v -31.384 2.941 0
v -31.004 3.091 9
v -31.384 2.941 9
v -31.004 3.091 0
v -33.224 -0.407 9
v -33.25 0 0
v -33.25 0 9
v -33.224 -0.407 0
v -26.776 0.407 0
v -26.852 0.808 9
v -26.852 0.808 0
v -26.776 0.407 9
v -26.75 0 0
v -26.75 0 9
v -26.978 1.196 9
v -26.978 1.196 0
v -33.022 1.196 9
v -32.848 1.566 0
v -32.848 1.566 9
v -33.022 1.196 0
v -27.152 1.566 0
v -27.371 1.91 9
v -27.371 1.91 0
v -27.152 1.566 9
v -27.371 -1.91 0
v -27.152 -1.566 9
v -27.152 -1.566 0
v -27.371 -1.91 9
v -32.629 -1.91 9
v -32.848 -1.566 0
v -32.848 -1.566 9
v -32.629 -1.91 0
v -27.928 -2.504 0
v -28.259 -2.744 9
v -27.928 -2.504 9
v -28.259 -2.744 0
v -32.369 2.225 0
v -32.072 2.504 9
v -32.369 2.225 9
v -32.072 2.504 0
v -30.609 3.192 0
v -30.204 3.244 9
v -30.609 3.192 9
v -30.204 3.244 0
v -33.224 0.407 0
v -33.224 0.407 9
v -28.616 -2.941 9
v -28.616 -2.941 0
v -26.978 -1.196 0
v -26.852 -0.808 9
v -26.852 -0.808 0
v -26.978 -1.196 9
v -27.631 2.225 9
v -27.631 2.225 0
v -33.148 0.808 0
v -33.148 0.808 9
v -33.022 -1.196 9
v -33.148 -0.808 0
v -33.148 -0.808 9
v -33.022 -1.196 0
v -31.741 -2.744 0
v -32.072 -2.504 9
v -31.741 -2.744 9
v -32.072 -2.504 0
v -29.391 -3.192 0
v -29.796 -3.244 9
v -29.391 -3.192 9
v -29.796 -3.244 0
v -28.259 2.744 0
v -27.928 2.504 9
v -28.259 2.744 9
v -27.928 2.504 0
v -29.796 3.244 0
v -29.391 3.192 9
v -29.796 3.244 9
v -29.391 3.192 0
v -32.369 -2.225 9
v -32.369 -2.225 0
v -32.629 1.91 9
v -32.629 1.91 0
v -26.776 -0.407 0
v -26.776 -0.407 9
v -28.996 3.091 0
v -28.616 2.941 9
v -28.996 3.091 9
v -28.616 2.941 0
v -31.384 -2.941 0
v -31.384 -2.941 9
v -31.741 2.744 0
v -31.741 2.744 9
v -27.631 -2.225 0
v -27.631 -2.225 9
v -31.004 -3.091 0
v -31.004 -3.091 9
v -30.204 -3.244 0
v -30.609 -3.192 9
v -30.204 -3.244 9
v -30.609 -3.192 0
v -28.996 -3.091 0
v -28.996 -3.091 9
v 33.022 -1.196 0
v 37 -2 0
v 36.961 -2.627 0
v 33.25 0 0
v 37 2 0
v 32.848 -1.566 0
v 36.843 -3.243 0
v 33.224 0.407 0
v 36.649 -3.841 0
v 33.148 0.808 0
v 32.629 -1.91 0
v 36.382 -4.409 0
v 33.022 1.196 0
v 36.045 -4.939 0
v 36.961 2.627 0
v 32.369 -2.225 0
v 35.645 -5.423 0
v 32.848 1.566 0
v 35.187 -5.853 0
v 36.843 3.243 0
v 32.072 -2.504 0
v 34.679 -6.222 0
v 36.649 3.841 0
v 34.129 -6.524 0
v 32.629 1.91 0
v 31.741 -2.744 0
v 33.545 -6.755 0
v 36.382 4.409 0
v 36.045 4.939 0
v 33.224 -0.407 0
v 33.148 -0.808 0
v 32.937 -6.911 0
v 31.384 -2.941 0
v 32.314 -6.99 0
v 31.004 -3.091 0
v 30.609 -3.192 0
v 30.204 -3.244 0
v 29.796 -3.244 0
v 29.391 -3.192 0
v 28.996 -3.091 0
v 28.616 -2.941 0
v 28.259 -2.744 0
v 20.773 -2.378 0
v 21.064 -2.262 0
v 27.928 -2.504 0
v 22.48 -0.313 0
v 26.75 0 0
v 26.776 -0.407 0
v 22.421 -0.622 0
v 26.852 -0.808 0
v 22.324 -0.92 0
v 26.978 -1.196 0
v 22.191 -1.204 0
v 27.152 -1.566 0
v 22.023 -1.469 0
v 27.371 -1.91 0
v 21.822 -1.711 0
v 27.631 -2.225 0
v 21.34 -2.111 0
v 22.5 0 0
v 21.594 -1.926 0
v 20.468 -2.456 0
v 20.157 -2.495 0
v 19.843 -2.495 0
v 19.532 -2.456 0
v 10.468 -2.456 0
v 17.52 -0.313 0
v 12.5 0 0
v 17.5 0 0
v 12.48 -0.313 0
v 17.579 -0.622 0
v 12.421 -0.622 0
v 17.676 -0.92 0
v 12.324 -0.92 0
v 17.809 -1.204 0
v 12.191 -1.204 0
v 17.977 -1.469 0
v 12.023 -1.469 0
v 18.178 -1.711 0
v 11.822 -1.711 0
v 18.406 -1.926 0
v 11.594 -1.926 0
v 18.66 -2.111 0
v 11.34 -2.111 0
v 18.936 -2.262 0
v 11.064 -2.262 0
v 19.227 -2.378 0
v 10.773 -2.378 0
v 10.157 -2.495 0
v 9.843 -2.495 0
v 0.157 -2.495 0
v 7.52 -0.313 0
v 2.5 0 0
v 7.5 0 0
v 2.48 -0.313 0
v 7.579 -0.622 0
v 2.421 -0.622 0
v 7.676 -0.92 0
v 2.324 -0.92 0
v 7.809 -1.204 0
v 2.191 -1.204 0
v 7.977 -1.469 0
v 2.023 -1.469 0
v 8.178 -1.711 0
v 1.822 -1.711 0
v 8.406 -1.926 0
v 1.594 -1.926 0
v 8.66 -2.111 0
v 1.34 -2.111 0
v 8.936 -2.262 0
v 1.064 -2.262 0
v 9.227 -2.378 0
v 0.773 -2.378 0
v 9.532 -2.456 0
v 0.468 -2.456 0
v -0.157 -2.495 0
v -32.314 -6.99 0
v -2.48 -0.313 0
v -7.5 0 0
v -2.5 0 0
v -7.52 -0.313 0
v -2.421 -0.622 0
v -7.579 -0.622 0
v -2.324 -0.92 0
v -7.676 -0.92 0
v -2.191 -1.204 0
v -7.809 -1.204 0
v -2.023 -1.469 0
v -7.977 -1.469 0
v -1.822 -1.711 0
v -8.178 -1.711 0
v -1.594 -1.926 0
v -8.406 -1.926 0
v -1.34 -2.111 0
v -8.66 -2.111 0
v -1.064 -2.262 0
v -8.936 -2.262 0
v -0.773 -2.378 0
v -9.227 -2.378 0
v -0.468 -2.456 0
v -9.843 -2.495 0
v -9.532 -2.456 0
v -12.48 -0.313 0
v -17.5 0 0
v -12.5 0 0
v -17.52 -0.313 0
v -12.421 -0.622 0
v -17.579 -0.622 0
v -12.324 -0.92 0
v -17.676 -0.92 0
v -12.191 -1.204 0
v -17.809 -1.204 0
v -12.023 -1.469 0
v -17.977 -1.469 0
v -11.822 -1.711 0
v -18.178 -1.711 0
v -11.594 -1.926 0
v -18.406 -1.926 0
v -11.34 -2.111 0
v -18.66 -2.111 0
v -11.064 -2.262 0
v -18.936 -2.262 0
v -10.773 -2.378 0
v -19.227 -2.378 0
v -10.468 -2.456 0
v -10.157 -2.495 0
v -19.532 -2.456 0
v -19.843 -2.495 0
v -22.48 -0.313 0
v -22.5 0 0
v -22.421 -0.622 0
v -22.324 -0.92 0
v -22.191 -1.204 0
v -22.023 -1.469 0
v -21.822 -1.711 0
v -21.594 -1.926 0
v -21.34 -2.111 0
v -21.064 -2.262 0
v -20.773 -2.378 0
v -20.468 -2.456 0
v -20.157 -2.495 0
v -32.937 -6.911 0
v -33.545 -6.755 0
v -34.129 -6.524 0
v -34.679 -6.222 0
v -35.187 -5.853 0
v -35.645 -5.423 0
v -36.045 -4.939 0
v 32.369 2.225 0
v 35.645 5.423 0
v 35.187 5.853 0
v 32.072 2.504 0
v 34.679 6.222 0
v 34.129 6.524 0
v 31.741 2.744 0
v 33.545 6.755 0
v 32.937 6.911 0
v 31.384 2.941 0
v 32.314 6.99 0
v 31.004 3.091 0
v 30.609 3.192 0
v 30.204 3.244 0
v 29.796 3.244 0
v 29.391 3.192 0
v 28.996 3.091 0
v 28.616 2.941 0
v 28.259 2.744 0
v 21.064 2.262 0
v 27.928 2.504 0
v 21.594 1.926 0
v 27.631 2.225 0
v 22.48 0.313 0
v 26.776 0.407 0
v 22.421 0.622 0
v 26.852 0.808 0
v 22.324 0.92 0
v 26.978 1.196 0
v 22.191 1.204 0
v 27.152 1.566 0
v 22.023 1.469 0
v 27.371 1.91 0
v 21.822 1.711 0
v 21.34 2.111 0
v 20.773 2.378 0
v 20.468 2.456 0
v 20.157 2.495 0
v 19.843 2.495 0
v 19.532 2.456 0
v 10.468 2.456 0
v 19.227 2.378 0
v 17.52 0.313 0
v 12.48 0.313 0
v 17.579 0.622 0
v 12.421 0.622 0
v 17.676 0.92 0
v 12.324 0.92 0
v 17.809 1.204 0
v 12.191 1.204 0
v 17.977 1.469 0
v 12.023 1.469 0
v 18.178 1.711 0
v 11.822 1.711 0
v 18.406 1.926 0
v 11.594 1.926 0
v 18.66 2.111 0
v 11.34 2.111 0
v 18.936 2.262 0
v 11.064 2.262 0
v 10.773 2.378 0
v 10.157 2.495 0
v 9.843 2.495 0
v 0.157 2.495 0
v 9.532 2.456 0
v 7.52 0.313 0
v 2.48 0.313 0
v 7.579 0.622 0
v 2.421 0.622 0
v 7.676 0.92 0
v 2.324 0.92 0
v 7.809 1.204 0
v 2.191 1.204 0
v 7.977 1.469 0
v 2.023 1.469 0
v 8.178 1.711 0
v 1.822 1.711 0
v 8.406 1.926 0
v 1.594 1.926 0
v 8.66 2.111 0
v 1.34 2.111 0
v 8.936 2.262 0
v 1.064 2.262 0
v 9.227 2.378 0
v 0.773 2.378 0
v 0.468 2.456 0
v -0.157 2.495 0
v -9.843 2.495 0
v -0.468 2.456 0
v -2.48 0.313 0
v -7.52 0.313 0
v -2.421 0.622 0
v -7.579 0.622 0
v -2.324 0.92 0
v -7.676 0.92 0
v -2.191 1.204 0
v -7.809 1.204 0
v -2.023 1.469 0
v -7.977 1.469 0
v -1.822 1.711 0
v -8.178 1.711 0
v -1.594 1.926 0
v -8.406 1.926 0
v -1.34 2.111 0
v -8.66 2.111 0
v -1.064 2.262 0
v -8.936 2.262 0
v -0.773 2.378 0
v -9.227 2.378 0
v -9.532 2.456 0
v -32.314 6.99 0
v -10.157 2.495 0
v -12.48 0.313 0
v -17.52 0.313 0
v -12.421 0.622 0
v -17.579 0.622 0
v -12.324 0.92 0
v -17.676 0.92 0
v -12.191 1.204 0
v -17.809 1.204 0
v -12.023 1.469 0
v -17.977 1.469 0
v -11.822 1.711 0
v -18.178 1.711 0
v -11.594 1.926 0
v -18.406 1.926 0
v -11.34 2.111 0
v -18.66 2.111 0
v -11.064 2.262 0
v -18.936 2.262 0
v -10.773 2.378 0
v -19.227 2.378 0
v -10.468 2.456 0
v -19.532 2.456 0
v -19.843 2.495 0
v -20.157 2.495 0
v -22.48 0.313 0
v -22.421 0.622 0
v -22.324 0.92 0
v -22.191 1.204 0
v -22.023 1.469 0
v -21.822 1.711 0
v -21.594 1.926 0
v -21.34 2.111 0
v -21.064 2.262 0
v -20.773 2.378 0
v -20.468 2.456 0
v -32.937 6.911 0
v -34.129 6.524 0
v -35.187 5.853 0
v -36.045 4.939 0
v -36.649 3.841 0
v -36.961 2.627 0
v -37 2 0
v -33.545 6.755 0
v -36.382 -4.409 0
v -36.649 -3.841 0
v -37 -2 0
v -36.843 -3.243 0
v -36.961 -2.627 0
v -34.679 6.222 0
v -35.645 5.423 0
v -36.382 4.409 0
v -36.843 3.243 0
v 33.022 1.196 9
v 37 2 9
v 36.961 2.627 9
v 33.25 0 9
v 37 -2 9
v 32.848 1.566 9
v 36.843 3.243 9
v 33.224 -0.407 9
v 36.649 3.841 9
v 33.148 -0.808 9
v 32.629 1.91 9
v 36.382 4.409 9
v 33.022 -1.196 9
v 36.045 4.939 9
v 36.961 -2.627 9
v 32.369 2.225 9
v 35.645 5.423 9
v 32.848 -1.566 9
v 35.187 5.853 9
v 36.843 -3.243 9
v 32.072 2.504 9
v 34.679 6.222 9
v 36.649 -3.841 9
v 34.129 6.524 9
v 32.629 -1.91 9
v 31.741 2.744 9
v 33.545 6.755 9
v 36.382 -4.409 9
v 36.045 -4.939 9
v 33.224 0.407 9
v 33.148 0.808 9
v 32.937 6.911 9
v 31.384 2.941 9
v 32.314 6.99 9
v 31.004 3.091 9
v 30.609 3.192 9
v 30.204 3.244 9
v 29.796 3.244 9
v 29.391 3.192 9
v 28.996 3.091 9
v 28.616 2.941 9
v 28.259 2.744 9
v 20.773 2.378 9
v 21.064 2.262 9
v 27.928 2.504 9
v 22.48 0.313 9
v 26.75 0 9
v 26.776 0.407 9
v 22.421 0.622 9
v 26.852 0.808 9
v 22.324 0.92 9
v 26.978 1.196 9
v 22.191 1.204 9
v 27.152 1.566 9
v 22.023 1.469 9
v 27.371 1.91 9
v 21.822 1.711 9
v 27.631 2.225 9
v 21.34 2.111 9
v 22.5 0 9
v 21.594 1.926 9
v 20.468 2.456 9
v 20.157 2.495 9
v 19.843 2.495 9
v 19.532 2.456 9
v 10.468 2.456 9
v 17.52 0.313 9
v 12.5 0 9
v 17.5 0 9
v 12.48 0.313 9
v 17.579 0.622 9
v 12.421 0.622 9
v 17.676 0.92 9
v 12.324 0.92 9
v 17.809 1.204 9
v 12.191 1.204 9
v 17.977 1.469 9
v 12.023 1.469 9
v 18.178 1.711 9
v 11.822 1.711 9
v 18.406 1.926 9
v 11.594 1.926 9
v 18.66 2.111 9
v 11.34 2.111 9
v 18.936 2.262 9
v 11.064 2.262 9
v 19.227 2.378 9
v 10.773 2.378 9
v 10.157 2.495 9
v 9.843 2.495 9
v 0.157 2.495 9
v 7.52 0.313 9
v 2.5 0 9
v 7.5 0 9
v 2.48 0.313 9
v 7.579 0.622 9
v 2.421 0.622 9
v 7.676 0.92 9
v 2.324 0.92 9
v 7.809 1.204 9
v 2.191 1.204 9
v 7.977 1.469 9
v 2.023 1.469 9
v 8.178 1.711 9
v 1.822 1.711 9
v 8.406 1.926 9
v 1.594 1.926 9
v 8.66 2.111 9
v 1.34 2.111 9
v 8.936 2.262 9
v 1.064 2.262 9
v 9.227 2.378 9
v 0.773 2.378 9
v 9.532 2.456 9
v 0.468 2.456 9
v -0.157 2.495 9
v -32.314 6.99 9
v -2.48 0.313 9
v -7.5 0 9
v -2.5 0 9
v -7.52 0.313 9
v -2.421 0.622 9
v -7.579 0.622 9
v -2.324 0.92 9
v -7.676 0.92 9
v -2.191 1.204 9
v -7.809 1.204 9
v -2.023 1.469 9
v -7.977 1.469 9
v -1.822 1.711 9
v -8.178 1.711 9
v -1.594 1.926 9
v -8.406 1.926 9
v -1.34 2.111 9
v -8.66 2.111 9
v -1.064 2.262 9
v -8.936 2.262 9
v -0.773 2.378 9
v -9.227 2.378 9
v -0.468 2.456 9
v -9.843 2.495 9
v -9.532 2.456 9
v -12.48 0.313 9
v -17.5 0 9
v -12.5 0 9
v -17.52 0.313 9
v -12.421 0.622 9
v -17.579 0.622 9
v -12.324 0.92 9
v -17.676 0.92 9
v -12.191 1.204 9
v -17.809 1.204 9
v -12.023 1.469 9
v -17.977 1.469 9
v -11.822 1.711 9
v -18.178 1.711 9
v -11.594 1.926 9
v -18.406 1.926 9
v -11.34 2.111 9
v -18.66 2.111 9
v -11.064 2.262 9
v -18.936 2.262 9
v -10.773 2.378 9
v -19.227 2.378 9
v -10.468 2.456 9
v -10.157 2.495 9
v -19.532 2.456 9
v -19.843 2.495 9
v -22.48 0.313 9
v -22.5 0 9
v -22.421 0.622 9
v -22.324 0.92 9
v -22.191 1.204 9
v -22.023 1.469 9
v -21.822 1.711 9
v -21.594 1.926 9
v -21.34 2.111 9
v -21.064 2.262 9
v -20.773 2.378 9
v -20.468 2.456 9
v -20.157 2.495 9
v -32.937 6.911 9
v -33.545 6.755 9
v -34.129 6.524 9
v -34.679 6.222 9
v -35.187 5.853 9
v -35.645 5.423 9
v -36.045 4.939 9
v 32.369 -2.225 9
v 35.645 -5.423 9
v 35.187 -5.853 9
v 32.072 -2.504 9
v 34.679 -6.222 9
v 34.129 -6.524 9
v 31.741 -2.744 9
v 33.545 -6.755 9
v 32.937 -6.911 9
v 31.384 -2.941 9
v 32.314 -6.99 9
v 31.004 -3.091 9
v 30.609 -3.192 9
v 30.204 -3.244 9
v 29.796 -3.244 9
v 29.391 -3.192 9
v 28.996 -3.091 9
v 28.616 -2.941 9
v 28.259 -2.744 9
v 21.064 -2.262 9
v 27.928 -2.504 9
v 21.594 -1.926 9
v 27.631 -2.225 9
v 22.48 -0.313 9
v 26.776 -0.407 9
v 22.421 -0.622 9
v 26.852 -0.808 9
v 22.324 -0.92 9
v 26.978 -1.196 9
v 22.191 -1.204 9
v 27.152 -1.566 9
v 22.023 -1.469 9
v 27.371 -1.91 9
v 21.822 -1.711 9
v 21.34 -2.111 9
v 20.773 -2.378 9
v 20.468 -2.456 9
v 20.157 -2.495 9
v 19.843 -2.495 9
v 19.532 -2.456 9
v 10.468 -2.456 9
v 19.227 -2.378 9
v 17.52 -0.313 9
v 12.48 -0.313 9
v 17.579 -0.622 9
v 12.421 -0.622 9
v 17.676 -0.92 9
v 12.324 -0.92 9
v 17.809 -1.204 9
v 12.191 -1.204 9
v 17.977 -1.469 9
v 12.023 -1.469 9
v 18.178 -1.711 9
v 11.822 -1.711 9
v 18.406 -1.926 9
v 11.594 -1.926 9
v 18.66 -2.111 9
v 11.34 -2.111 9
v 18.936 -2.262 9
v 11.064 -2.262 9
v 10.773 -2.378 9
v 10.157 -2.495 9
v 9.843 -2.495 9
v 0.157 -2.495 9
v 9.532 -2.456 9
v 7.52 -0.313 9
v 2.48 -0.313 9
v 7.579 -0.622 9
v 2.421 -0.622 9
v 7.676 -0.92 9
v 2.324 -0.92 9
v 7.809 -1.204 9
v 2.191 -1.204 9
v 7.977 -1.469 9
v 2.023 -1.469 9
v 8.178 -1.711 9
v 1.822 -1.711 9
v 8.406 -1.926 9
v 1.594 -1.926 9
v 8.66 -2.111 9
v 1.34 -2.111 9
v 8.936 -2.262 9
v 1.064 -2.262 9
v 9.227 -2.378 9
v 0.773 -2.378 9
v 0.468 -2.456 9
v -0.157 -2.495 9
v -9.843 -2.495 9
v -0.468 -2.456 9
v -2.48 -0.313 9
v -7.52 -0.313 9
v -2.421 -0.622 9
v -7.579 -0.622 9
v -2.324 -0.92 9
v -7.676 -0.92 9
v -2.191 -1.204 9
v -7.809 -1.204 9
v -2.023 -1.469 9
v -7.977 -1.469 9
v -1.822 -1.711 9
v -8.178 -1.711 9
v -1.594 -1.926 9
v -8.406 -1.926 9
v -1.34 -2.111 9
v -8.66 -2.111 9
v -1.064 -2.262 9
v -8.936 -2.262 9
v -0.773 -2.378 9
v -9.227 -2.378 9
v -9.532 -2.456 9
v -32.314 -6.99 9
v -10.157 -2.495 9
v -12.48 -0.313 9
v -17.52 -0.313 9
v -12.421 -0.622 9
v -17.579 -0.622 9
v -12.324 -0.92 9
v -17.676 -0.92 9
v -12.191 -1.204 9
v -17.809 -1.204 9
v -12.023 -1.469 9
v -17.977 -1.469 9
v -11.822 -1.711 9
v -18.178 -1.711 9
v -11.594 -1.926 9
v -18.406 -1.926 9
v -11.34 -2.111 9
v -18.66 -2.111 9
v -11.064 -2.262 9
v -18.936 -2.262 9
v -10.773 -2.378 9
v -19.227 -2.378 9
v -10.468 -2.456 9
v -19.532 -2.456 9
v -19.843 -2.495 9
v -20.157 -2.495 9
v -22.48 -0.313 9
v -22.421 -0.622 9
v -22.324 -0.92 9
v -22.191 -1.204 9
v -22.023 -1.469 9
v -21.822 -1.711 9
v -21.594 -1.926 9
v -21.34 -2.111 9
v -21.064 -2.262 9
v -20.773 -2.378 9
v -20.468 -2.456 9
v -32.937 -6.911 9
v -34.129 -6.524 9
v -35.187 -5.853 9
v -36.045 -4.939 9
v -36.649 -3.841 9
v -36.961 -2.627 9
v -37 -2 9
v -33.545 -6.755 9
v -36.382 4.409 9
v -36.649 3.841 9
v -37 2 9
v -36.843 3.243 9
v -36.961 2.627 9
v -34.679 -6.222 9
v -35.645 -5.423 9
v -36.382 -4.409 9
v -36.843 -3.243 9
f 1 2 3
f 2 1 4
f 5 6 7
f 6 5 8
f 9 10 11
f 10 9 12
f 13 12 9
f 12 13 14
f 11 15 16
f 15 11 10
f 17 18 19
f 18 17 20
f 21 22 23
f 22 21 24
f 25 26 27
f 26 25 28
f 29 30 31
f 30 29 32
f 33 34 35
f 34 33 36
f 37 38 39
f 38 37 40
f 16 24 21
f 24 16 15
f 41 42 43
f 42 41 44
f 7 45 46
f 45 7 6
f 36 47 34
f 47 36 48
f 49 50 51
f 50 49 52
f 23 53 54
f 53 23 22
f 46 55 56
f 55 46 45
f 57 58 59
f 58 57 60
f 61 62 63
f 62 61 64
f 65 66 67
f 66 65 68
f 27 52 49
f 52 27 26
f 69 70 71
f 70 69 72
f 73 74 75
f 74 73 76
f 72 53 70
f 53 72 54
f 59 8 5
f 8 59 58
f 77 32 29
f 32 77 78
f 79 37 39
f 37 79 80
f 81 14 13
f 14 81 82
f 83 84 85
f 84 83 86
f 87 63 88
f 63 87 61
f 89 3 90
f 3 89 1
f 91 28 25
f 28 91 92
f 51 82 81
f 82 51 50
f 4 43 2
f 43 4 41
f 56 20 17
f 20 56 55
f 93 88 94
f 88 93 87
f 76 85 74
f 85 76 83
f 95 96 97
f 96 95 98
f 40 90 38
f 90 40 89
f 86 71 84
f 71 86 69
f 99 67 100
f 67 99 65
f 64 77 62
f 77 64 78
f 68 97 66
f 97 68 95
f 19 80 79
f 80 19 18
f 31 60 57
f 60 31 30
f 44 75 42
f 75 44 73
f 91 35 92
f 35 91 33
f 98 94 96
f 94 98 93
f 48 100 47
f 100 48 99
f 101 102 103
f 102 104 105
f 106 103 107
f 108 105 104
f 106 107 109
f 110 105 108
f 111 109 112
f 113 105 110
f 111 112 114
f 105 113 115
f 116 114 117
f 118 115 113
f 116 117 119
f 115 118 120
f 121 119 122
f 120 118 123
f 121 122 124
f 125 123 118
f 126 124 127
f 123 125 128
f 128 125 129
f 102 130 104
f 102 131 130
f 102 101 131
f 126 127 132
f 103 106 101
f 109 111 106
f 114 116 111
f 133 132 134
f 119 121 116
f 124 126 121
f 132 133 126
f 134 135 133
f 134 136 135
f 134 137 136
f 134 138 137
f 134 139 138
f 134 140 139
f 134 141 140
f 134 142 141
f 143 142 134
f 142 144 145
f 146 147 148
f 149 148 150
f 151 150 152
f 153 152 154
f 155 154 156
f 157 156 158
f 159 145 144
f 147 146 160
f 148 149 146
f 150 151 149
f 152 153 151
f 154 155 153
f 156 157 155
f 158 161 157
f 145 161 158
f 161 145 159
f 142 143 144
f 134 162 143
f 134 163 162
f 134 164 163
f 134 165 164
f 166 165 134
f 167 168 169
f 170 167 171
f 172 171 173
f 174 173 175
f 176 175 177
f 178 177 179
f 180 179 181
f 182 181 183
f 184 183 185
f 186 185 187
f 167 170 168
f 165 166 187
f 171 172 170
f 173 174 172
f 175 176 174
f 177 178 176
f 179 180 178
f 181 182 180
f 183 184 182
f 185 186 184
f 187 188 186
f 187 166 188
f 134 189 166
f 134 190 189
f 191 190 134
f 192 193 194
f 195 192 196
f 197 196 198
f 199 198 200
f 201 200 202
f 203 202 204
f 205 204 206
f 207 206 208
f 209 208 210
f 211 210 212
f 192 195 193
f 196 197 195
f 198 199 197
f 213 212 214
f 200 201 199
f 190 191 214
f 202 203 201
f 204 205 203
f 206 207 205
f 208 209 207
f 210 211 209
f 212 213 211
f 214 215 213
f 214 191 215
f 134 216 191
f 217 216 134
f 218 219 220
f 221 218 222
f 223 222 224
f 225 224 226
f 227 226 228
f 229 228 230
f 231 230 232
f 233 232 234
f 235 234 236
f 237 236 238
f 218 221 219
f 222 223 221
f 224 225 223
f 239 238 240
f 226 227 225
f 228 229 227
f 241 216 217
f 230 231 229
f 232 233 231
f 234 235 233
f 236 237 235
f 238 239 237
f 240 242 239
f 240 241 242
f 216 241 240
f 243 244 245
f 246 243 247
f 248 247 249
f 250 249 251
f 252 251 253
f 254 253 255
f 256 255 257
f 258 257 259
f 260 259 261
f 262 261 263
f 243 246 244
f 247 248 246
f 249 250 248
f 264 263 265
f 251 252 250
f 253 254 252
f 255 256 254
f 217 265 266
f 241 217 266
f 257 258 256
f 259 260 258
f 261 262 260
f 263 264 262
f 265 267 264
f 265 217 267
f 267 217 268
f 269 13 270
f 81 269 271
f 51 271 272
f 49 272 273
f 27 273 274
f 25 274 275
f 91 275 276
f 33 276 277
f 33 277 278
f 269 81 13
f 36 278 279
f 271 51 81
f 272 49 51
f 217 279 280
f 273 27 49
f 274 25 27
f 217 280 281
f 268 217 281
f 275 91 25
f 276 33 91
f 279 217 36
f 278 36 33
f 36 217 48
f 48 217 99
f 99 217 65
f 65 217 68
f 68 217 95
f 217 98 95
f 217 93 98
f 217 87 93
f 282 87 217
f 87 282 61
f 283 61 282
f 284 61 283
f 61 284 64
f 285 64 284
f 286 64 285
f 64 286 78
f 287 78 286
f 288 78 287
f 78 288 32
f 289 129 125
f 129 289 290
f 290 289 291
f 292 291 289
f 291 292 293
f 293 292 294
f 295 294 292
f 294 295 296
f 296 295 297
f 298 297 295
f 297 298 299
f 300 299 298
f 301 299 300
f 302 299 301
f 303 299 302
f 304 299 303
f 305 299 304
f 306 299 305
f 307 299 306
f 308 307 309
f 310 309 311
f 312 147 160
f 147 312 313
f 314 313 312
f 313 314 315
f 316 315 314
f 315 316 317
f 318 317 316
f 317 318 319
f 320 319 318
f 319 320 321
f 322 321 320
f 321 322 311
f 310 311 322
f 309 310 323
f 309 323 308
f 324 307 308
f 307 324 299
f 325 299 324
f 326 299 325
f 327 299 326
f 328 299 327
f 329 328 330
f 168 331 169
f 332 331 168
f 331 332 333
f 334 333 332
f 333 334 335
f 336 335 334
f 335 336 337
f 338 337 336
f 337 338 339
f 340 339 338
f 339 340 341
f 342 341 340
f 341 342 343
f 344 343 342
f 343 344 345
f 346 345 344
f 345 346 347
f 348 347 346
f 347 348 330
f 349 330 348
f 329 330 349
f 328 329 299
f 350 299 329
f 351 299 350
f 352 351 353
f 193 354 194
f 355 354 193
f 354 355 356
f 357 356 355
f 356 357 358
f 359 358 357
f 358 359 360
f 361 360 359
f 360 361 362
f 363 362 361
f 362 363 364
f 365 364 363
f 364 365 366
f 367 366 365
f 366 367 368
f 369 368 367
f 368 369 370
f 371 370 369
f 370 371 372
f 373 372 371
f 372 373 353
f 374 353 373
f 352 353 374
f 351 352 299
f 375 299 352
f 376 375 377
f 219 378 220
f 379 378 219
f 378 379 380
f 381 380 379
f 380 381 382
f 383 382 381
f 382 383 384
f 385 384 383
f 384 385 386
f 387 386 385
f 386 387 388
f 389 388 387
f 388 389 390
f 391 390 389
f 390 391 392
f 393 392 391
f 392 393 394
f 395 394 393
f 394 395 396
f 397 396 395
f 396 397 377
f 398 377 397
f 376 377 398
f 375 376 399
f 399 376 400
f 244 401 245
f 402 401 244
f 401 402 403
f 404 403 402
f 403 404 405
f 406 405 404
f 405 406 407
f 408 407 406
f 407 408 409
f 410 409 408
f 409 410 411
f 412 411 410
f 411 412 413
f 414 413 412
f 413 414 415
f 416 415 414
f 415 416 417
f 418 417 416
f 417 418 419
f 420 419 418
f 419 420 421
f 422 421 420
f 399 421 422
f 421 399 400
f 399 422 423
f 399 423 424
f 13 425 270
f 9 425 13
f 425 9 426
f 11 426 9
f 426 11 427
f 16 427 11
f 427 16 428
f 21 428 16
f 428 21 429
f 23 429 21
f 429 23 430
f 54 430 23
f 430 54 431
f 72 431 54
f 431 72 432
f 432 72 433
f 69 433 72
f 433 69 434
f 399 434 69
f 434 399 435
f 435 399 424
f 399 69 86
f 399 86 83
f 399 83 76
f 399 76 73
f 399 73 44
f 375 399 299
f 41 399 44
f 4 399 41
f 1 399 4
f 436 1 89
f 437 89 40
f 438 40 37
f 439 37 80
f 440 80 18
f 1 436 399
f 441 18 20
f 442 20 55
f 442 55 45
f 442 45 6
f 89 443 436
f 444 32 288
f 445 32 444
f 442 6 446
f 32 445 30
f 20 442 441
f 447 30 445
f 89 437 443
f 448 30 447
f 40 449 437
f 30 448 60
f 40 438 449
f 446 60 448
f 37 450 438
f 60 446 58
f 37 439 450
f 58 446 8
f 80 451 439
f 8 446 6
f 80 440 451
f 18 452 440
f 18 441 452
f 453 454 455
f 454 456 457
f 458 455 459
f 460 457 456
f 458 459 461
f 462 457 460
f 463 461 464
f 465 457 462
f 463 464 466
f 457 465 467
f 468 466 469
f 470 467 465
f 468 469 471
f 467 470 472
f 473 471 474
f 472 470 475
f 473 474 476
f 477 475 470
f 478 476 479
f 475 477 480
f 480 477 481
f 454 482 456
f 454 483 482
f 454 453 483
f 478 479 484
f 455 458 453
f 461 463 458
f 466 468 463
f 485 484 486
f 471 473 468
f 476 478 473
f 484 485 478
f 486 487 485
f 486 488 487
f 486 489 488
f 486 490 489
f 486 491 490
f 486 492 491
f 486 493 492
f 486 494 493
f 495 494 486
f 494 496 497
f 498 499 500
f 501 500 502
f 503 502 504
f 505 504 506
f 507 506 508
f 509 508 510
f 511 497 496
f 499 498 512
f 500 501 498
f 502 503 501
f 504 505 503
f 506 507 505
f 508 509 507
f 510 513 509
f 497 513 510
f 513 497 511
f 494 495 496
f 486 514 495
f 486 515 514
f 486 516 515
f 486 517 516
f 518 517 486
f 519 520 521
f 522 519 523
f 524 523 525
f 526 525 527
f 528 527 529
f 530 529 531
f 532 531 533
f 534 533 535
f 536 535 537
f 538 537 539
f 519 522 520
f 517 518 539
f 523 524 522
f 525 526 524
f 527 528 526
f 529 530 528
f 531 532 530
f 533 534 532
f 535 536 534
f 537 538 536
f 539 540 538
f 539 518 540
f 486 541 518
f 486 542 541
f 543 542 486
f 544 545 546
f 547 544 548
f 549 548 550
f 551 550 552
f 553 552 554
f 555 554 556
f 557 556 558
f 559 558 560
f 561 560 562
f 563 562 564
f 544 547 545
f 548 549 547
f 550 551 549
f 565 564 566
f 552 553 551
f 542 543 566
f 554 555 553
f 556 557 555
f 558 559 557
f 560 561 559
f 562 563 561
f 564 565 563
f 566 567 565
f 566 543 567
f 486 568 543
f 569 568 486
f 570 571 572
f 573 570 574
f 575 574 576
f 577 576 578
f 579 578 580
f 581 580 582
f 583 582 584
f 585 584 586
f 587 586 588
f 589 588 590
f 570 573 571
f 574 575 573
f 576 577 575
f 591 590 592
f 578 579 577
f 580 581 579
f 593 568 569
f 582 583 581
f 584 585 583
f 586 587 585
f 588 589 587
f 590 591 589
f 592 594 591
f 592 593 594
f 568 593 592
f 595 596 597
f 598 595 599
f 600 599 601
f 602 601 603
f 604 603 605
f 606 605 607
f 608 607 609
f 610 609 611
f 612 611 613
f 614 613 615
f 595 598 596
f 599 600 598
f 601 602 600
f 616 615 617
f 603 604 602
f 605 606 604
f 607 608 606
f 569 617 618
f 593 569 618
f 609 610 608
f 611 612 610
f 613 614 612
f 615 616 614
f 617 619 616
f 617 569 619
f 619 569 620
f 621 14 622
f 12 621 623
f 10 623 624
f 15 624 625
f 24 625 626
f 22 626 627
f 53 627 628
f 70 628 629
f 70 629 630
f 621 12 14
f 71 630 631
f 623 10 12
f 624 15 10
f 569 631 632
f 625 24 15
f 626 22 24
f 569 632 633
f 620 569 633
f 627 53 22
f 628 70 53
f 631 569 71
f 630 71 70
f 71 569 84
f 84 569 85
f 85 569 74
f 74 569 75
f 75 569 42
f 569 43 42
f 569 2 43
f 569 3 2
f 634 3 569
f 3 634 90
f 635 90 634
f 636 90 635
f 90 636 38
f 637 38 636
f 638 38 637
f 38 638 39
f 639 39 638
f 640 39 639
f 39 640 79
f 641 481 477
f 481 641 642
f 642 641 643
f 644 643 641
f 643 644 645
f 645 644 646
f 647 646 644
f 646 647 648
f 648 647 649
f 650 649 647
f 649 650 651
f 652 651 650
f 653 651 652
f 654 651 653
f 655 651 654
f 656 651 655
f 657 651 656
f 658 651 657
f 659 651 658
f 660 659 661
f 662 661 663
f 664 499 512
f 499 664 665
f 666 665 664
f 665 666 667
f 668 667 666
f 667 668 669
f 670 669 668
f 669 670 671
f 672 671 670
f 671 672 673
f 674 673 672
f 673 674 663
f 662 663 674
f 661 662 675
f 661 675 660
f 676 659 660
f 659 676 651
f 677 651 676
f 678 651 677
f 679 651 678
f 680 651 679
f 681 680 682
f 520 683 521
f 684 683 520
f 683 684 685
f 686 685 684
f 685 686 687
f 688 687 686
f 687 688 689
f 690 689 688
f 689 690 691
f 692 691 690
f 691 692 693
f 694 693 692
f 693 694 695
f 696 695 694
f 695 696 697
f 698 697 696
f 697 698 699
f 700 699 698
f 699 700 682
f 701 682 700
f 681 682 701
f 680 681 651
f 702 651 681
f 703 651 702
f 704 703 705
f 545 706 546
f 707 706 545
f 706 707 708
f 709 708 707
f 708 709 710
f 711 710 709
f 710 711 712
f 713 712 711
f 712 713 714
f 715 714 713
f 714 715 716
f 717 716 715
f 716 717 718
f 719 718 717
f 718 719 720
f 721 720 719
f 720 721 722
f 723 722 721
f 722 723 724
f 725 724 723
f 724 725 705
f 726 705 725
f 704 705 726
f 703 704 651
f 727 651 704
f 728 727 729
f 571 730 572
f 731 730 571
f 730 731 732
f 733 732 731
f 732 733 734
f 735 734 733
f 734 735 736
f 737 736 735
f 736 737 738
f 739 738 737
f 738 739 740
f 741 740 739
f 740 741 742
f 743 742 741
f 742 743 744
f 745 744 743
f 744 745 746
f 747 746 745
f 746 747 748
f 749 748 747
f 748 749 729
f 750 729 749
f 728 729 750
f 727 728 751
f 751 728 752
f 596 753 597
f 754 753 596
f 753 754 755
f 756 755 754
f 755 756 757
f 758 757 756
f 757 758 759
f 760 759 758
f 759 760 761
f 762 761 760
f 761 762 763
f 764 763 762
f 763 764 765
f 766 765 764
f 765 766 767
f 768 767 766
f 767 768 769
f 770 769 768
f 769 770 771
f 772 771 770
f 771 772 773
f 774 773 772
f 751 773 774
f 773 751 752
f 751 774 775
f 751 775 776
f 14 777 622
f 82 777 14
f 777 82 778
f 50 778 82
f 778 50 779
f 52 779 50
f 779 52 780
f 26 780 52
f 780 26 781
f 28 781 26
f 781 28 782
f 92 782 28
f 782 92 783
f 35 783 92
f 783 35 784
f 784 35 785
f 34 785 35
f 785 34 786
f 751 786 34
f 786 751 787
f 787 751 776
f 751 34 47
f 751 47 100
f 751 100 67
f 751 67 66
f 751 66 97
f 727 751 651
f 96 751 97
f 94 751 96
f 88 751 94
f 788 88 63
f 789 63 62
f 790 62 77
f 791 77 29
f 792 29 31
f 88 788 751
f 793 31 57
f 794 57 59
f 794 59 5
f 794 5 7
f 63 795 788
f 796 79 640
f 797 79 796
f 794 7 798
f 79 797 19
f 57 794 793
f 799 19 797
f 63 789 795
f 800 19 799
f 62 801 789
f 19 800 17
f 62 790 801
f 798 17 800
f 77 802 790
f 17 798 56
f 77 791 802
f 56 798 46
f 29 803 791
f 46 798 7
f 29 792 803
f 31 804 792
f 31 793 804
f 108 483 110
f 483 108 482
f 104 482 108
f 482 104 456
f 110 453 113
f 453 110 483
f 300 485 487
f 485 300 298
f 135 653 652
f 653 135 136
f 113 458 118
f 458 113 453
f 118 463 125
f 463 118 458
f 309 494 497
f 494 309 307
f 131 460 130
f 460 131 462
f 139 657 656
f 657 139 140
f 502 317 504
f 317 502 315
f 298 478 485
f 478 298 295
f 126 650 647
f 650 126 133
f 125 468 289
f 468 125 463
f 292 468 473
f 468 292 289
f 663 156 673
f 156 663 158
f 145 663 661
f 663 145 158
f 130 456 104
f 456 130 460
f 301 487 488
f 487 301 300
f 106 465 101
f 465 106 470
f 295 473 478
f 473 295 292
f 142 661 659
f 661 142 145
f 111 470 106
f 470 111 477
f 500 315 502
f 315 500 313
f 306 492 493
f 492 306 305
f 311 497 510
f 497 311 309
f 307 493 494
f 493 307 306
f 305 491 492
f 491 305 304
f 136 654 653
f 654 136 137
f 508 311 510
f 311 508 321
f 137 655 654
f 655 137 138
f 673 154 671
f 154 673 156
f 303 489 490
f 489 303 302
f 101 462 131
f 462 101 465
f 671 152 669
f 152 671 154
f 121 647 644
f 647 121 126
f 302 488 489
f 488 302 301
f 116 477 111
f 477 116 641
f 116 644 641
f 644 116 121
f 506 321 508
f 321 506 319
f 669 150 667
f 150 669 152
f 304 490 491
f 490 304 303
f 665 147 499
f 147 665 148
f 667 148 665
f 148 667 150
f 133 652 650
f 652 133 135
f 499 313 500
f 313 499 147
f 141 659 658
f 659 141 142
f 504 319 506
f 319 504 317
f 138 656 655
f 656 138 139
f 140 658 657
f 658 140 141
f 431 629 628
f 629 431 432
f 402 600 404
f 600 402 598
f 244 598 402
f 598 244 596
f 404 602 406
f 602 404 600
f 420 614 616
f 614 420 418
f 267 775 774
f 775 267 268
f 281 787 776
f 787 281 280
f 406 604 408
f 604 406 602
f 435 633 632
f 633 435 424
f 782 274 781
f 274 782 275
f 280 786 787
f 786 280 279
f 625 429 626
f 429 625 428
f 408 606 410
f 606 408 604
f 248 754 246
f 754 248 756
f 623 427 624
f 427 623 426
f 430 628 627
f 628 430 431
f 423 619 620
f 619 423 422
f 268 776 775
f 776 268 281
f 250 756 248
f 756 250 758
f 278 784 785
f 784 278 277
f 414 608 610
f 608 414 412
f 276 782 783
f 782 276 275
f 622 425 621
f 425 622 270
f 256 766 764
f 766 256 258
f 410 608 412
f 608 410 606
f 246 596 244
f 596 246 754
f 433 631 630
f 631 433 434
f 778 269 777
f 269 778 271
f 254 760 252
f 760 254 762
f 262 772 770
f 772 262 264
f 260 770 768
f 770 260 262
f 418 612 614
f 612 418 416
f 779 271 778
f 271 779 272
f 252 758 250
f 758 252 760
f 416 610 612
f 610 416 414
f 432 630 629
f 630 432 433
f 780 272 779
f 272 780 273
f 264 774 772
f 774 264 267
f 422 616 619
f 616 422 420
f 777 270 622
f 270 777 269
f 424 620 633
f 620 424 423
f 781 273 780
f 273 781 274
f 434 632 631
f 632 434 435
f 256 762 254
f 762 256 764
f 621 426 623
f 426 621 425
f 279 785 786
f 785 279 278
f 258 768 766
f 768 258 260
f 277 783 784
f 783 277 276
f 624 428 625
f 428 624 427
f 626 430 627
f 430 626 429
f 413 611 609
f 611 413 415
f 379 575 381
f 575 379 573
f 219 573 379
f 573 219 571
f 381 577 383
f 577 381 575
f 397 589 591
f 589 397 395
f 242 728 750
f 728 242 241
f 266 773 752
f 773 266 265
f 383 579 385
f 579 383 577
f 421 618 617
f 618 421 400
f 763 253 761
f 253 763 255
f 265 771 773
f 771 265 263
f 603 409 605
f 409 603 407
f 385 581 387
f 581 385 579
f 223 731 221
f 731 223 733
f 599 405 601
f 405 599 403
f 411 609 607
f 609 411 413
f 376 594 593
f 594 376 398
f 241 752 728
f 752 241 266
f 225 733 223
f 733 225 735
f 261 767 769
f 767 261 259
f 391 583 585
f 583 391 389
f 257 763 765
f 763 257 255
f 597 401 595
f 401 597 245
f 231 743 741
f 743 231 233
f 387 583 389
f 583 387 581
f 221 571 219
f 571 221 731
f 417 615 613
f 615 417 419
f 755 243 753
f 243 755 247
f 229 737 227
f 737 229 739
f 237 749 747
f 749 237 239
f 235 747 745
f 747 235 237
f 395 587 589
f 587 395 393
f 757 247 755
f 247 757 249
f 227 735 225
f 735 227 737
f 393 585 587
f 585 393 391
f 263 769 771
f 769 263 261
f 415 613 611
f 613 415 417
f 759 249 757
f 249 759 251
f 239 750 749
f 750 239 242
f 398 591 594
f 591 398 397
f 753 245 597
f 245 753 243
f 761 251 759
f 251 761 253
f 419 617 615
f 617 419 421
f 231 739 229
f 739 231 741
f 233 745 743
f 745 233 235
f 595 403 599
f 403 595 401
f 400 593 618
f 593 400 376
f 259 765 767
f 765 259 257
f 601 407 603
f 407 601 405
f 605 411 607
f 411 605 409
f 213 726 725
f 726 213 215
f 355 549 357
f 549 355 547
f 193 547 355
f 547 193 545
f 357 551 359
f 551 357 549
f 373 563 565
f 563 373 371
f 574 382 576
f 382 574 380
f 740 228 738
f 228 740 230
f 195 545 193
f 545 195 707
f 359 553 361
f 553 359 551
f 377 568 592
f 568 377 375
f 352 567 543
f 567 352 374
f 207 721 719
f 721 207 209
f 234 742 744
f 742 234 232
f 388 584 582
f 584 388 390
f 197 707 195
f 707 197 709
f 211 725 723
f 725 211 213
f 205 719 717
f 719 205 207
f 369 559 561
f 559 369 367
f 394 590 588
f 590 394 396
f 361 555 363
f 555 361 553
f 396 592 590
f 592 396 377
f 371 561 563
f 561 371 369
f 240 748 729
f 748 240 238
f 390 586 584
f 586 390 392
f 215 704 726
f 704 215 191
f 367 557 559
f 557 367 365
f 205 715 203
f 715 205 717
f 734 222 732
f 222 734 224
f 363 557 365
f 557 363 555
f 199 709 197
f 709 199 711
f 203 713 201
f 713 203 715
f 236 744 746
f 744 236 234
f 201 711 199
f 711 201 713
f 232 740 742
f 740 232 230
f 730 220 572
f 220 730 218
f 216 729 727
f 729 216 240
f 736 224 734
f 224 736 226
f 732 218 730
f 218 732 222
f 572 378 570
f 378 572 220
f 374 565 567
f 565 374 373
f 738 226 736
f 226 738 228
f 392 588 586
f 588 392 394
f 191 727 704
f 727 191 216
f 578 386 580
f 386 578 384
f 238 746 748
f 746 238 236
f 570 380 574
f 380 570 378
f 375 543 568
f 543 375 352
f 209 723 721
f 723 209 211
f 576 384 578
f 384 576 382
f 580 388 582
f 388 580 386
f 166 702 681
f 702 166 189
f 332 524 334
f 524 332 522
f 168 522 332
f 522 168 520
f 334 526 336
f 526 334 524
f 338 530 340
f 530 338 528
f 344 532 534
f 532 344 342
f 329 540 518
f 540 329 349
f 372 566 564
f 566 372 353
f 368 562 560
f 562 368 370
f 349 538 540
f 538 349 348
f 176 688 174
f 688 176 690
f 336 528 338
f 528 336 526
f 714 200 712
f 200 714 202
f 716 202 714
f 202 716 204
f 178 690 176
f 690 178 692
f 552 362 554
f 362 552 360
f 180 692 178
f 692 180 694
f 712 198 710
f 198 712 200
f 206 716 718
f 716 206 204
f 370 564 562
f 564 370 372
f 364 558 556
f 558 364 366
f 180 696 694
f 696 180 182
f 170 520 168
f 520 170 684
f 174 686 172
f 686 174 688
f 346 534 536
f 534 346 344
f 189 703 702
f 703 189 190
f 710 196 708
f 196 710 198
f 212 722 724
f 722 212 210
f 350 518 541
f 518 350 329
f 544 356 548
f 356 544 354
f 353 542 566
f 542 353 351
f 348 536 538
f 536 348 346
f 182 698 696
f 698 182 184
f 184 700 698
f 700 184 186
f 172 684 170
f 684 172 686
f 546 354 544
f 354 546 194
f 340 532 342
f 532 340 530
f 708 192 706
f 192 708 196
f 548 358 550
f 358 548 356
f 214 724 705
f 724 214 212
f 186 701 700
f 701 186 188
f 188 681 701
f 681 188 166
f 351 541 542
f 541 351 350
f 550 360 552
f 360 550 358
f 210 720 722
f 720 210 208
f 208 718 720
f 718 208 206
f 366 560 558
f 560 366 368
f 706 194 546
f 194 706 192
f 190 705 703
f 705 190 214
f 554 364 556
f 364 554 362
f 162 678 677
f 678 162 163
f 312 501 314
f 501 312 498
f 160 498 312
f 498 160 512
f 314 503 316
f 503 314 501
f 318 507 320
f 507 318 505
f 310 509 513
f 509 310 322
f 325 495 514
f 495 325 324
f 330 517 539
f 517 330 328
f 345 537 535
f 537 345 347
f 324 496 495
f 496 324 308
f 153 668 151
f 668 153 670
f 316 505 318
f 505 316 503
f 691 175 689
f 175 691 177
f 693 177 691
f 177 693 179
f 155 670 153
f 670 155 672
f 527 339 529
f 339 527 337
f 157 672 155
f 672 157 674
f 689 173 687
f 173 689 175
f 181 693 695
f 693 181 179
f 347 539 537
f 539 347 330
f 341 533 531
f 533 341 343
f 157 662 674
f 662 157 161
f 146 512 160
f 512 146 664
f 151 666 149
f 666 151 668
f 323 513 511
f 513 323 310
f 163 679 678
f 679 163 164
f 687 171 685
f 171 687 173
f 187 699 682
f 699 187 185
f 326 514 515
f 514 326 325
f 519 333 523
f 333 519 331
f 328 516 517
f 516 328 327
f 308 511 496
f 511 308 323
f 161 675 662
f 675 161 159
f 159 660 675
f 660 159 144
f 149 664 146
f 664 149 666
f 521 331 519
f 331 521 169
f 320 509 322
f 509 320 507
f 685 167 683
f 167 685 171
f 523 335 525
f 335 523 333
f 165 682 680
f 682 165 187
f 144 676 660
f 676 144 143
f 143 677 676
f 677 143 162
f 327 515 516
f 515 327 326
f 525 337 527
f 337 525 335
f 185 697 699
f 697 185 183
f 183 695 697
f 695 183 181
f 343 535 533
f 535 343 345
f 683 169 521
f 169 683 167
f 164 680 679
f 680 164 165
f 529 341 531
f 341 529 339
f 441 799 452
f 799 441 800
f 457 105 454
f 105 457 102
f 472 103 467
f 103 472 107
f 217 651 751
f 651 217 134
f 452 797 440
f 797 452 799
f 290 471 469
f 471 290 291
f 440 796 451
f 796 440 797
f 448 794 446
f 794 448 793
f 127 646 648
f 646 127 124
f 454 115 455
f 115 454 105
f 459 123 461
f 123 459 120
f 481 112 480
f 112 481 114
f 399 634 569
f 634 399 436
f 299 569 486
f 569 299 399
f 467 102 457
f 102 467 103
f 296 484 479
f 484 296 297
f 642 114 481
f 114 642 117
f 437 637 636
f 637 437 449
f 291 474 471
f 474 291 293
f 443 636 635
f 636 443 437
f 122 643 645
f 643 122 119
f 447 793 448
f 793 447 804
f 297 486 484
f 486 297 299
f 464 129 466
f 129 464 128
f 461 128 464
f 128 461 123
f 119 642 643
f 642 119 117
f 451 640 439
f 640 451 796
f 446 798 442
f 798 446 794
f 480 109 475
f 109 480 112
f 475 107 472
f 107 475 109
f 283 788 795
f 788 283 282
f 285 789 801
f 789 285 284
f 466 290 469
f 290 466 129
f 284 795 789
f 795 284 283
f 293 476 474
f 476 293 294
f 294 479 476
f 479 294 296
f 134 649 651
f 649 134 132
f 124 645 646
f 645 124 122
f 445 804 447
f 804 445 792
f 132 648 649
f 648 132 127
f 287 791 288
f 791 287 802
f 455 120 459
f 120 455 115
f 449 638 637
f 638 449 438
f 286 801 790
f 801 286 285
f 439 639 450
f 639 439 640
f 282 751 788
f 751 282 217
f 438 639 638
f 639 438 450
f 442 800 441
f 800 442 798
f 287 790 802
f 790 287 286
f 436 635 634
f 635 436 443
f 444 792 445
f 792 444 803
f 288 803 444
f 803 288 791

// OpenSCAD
$fn = 50;

difference() {
	union() {
		hull() {
			translate(v = [-32.0, 2.0, 0]) {
				cylinder(h = 9, r = 5);
			}
			translate(v = [32.0, 2.0, 0]) {
				cylinder(h = 9, r = 5);
			}
			translate(v = [-32.0, -2.0, 0]) {
				cylinder(h = 9, r = 5);
			}
			translate(v = [32.0, -2.0, 0]) {
				cylinder(h = 9, r = 5);
			}
		}
	}
	union() {
		translate(v = [-30.0, 0.0, 0]) {
			cylinder(h = 9, r = 3.25);
		}
		translate(v = [30.0, 0.0, 0]) {
			cylinder(h = 9, r = 3.25);
		}
		translate(v = [-20.0, 0, 0.0]) {
			cylinder(h = 9, r = 2.5);
		}
		translate(v = [-10.0, 0, 0.0]) {
			cylinder(h = 9, r = 2.5);
		}
		cylinder(h = 9, r = 2.5);
		translate(v = [10.0, 0, 0.0]) {
			cylinder(h = 9, r = 2.5);
		}
		translate(v = [20.0, 0, 0.0]) {
			cylinder(h = 9, r = 2.5);
		}
	}
}
